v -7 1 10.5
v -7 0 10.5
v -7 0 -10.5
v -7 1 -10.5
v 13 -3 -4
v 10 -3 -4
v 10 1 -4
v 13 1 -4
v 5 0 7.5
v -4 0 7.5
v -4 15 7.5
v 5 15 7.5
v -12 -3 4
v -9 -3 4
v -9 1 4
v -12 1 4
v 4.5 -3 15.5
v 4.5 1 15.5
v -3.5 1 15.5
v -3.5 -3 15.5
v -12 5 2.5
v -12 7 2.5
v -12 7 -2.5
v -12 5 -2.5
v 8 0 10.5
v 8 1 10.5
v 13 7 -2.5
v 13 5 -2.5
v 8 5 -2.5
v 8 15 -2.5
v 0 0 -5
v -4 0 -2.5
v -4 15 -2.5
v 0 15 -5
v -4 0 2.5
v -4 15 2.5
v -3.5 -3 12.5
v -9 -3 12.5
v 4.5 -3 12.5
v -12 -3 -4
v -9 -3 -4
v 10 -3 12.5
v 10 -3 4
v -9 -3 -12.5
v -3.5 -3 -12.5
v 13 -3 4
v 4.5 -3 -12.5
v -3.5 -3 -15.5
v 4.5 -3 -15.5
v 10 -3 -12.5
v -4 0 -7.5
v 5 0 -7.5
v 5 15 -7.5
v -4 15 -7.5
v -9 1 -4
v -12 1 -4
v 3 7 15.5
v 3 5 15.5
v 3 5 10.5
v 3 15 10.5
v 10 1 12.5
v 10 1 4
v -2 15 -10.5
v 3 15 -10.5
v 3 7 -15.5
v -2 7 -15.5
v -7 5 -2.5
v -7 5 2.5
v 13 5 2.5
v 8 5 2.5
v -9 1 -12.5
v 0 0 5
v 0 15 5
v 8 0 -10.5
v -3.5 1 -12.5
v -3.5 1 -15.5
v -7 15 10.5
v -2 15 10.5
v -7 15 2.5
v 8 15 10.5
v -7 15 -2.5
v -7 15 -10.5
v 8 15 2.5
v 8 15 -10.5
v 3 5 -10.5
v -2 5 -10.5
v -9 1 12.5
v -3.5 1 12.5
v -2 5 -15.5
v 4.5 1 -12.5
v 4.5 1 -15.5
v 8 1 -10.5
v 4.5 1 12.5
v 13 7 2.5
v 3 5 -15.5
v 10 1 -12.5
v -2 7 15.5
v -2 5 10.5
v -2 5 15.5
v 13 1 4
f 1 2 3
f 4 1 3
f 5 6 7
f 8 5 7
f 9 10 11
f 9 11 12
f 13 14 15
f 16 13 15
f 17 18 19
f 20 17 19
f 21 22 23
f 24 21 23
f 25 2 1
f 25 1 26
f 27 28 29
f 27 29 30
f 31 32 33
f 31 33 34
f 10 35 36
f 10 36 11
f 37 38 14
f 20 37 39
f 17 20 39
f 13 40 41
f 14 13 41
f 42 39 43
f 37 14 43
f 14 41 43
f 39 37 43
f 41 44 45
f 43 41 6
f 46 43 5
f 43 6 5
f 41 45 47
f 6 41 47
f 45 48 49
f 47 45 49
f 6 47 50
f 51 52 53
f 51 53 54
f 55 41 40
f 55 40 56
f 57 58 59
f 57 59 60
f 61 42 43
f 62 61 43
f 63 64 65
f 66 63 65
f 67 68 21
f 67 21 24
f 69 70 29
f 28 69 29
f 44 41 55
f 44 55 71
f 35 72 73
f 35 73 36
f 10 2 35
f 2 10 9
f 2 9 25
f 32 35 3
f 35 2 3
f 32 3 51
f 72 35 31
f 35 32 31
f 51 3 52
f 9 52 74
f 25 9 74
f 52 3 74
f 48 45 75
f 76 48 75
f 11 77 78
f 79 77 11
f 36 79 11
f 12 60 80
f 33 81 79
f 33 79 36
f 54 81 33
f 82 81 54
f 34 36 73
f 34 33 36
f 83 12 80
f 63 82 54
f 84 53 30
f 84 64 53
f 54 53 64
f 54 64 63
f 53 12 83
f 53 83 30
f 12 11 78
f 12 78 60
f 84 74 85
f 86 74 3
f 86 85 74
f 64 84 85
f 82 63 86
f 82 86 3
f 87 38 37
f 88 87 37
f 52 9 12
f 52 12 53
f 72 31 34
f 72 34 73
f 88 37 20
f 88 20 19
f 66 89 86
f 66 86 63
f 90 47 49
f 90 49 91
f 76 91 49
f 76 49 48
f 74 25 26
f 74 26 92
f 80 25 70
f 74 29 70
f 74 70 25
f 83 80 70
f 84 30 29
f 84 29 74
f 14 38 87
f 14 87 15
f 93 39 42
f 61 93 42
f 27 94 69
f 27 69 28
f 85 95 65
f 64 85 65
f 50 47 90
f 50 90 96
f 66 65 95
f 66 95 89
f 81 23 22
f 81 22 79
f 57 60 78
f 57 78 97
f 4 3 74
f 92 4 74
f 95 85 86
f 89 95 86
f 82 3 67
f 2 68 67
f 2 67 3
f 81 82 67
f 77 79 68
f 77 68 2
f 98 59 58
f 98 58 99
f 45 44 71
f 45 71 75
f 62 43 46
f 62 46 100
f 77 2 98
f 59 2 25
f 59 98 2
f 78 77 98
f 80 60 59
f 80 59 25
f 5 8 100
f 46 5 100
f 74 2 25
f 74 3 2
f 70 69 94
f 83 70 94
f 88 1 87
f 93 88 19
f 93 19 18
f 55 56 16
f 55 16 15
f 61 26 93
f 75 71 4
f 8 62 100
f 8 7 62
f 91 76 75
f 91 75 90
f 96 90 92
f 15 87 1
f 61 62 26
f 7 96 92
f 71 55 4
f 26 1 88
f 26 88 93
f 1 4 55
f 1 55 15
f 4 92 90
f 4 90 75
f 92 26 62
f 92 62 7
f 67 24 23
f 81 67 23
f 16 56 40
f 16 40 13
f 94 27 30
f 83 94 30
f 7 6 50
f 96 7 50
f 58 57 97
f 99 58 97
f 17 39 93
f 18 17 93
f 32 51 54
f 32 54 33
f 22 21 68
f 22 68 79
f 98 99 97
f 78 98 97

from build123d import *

# Parameters (mm, degrees)
BOSS_EXTRUDE1_DEPTH      = 15
BOSS_EXTRUDE2_DEPTH      = 18
BOSS_EXTRUDE3_DEPTH      = 1
BOSS_EXTRUDE3_DEPTH_BACK = 3
SKETCH3_W                = 19
SKETCH3_H                = 25
SKETCH3_W_2              = 15
SKETCH3_H_2              = 21
SKETCH4_W                = 8
SKETCH4_H                = 4
BOSS_EXTRUDE4_DEPTH      = 3
SKETCH5_W                = 8
SKETCH5_H                = 4
BOSS_EXTRUDE5_DEPTH      = 3
SKETCH6_W                = 5
SKETCH6_H                = 10
BOSS_EXTRUDE6_DEPTH      = 5
CUT_EXTRUDE1_DEPTH       = 27.272609311
SKETCH8_W                = 5
SKETCH8_H                = 10
BOSS_EXTRUDE7_DEPTH      = 5
CUT_EXTRUDE2_DEPTH       = 5


# Read off the part's stored shape, not the designer's step: Split1
with BuildPart() as part:
    # Sketch1 → Boss-Extrude1 (new body)
    with BuildSketch(Plane(origin=(0, 0, 0), x_dir=(1, 0, 0), z_dir=(0, 1, 0))):
        Polygon((-4, 7.5), (-4, 2.5), (0, 5), (0, -5), (-4, -2.5), (-4, -7.5), (5, -7.5), (5, 7.5), align=None)
    extrude(amount=BOSS_EXTRUDE1_DEPTH)


with BuildPart() as body_2:
    # Sketch2 → Boss-Extrude2 (new body)
    with BuildSketch(Plane(origin=(0, 15, 0), x_dir=(1, 0, 0), z_dir=(0, 1, 0))):
        Polygon((-7, 2.5), (-7, -2.5), (-7, -10.5), (8, -10.5), (8, 10.5), (-7, 10.5), align=None)
    extrude(amount=-BOSS_EXTRUDE2_DEPTH)

    # Combine3: cut part
    add(part.part, mode=Mode.SUBTRACT)


with BuildPart() as body_2_2:
    # Split1: the piece on the far side of the plane
    add(body_2.part)
    split(bisect_by=Plane(origin=(0, 0, 0), x_dir=(1, 0, 0), z_dir=(0, 1, 0)), keep=Keep.BOTTOM)

    # Sketch3 → Boss-Extrude3 (add, two sides: drawn at the far end of the back side and taken through both)
    with BuildSketch(Plane(origin=(0, 0, 0), x_dir=(1, 0, 0), z_dir=(0, 1, 0)).offset(-BOSS_EXTRUDE3_DEPTH_BACK)):
        with Locations((0.5, 0)):
            Rectangle(SKETCH3_W, SKETCH3_H)
        with Locations((0.5, 0)):
            Rectangle(SKETCH3_W_2, SKETCH3_H_2, mode=Mode.SUBTRACT)
    extrude(amount=BOSS_EXTRUDE3_DEPTH + BOSS_EXTRUDE3_DEPTH_BACK)

    # Sketch4 → Boss-Extrude4 (add)
    with BuildSketch(Plane(origin=(0, 0, -12.5), x_dir=(-1, 0, 0), z_dir=(0, 0, -1))):
        with Locations((-0.5, -1)):
            Rectangle(SKETCH4_W, SKETCH4_H)
    boss_extrude4 = extrude(amount=BOSS_EXTRUDE4_DEPTH)

    # Mirror1: Boss-Extrude4 across plane
    add(boss_extrude4.mirror(Plane.XY))

    # Sketch5 → Boss-Extrude5 (add)
    with BuildSketch(Plane.ZY.offset(9)):
        with Locations((0, -1)):
            Rectangle(SKETCH5_W, SKETCH5_H)
    boss_extrude5 = extrude(amount=BOSS_EXTRUDE5_DEPTH)

    # Mirror2: Boss-Extrude5 across plane
    add(boss_extrude5.mirror(Plane(origin=(0.5, 0, 0), x_dir=(0, 0, 1), z_dir=(1, 0, 0))))


with BuildPart() as body_2_1:
    add(body_2.part)

    # Split1
    split(bisect_by=Plane(origin=(0, 0, 0), x_dir=(1, 0, 0), z_dir=(0, 1, 0)), keep=Keep.TOP)

    # Sketch6 → Boss-Extrude6 (add)
    with BuildSketch(Plane(origin=(0, 0, -10.5), x_dir=(-1, 0, 0), z_dir=(0, 0, -1))):
        with Locations((-0.5, 10)):
            Rectangle(SKETCH6_W, SKETCH6_H)
    boss_extrude6 = extrude(amount=BOSS_EXTRUDE6_DEPTH)

    # Sketch7 → Cut-Extrude1 (cut, through all)
    with BuildSketch(Plane(origin=(3, 0, 0), x_dir=(0, 0, -1), z_dir=(1, 0, 0))):
        Polygon((10.5, 15), (15.5, 7), (15.5, 15), align=None)
    cut_extrude1 = extrude(amount=-CUT_EXTRUDE1_DEPTH, mode=Mode.SUBTRACT)

    # Mirror3: Boss-Extrude6, Cut-Extrude1 across plane
    add(boss_extrude6.mirror(Plane.XY))
    add(cut_extrude1.mirror(Plane.XY), mode=Mode.SUBTRACT)

    # Sketch8 → Boss-Extrude7 (add)
    with BuildSketch(Plane(origin=(8, 0, 0), x_dir=(0, 0, -1), z_dir=(1, 0, 0))):
        with Locations((0, 10)):
            Rectangle(SKETCH8_W, SKETCH8_H)
    boss_extrude7 = extrude(amount=BOSS_EXTRUDE7_DEPTH)

    # Sketch9 → Cut-Extrude2 (cut)
    with BuildSketch(Plane(origin=(0, 0, -2.5), x_dir=(-1, 0, 0), z_dir=(0, 0, -1))):
        Polygon((-13, 15), (-13, 7), (-8, 15), align=None)
    cut_extrude2 = extrude(amount=-CUT_EXTRUDE2_DEPTH, mode=Mode.SUBTRACT)

    # Mirror4: Boss-Extrude7, Cut-Extrude2 across plane
    add(boss_extrude7.mirror(Plane(origin=(0.5, 0, 0), x_dir=(0, 0, 1), z_dir=(1, 0, 0))))
    add(cut_extrude2.mirror(Plane(origin=(0.5, 0, 0), x_dir=(0, 0, 1), z_dir=(1, 0, 0))), mode=Mode.SUBTRACT)


solid = Compound([body_2_2.part, body_2_1.part])
